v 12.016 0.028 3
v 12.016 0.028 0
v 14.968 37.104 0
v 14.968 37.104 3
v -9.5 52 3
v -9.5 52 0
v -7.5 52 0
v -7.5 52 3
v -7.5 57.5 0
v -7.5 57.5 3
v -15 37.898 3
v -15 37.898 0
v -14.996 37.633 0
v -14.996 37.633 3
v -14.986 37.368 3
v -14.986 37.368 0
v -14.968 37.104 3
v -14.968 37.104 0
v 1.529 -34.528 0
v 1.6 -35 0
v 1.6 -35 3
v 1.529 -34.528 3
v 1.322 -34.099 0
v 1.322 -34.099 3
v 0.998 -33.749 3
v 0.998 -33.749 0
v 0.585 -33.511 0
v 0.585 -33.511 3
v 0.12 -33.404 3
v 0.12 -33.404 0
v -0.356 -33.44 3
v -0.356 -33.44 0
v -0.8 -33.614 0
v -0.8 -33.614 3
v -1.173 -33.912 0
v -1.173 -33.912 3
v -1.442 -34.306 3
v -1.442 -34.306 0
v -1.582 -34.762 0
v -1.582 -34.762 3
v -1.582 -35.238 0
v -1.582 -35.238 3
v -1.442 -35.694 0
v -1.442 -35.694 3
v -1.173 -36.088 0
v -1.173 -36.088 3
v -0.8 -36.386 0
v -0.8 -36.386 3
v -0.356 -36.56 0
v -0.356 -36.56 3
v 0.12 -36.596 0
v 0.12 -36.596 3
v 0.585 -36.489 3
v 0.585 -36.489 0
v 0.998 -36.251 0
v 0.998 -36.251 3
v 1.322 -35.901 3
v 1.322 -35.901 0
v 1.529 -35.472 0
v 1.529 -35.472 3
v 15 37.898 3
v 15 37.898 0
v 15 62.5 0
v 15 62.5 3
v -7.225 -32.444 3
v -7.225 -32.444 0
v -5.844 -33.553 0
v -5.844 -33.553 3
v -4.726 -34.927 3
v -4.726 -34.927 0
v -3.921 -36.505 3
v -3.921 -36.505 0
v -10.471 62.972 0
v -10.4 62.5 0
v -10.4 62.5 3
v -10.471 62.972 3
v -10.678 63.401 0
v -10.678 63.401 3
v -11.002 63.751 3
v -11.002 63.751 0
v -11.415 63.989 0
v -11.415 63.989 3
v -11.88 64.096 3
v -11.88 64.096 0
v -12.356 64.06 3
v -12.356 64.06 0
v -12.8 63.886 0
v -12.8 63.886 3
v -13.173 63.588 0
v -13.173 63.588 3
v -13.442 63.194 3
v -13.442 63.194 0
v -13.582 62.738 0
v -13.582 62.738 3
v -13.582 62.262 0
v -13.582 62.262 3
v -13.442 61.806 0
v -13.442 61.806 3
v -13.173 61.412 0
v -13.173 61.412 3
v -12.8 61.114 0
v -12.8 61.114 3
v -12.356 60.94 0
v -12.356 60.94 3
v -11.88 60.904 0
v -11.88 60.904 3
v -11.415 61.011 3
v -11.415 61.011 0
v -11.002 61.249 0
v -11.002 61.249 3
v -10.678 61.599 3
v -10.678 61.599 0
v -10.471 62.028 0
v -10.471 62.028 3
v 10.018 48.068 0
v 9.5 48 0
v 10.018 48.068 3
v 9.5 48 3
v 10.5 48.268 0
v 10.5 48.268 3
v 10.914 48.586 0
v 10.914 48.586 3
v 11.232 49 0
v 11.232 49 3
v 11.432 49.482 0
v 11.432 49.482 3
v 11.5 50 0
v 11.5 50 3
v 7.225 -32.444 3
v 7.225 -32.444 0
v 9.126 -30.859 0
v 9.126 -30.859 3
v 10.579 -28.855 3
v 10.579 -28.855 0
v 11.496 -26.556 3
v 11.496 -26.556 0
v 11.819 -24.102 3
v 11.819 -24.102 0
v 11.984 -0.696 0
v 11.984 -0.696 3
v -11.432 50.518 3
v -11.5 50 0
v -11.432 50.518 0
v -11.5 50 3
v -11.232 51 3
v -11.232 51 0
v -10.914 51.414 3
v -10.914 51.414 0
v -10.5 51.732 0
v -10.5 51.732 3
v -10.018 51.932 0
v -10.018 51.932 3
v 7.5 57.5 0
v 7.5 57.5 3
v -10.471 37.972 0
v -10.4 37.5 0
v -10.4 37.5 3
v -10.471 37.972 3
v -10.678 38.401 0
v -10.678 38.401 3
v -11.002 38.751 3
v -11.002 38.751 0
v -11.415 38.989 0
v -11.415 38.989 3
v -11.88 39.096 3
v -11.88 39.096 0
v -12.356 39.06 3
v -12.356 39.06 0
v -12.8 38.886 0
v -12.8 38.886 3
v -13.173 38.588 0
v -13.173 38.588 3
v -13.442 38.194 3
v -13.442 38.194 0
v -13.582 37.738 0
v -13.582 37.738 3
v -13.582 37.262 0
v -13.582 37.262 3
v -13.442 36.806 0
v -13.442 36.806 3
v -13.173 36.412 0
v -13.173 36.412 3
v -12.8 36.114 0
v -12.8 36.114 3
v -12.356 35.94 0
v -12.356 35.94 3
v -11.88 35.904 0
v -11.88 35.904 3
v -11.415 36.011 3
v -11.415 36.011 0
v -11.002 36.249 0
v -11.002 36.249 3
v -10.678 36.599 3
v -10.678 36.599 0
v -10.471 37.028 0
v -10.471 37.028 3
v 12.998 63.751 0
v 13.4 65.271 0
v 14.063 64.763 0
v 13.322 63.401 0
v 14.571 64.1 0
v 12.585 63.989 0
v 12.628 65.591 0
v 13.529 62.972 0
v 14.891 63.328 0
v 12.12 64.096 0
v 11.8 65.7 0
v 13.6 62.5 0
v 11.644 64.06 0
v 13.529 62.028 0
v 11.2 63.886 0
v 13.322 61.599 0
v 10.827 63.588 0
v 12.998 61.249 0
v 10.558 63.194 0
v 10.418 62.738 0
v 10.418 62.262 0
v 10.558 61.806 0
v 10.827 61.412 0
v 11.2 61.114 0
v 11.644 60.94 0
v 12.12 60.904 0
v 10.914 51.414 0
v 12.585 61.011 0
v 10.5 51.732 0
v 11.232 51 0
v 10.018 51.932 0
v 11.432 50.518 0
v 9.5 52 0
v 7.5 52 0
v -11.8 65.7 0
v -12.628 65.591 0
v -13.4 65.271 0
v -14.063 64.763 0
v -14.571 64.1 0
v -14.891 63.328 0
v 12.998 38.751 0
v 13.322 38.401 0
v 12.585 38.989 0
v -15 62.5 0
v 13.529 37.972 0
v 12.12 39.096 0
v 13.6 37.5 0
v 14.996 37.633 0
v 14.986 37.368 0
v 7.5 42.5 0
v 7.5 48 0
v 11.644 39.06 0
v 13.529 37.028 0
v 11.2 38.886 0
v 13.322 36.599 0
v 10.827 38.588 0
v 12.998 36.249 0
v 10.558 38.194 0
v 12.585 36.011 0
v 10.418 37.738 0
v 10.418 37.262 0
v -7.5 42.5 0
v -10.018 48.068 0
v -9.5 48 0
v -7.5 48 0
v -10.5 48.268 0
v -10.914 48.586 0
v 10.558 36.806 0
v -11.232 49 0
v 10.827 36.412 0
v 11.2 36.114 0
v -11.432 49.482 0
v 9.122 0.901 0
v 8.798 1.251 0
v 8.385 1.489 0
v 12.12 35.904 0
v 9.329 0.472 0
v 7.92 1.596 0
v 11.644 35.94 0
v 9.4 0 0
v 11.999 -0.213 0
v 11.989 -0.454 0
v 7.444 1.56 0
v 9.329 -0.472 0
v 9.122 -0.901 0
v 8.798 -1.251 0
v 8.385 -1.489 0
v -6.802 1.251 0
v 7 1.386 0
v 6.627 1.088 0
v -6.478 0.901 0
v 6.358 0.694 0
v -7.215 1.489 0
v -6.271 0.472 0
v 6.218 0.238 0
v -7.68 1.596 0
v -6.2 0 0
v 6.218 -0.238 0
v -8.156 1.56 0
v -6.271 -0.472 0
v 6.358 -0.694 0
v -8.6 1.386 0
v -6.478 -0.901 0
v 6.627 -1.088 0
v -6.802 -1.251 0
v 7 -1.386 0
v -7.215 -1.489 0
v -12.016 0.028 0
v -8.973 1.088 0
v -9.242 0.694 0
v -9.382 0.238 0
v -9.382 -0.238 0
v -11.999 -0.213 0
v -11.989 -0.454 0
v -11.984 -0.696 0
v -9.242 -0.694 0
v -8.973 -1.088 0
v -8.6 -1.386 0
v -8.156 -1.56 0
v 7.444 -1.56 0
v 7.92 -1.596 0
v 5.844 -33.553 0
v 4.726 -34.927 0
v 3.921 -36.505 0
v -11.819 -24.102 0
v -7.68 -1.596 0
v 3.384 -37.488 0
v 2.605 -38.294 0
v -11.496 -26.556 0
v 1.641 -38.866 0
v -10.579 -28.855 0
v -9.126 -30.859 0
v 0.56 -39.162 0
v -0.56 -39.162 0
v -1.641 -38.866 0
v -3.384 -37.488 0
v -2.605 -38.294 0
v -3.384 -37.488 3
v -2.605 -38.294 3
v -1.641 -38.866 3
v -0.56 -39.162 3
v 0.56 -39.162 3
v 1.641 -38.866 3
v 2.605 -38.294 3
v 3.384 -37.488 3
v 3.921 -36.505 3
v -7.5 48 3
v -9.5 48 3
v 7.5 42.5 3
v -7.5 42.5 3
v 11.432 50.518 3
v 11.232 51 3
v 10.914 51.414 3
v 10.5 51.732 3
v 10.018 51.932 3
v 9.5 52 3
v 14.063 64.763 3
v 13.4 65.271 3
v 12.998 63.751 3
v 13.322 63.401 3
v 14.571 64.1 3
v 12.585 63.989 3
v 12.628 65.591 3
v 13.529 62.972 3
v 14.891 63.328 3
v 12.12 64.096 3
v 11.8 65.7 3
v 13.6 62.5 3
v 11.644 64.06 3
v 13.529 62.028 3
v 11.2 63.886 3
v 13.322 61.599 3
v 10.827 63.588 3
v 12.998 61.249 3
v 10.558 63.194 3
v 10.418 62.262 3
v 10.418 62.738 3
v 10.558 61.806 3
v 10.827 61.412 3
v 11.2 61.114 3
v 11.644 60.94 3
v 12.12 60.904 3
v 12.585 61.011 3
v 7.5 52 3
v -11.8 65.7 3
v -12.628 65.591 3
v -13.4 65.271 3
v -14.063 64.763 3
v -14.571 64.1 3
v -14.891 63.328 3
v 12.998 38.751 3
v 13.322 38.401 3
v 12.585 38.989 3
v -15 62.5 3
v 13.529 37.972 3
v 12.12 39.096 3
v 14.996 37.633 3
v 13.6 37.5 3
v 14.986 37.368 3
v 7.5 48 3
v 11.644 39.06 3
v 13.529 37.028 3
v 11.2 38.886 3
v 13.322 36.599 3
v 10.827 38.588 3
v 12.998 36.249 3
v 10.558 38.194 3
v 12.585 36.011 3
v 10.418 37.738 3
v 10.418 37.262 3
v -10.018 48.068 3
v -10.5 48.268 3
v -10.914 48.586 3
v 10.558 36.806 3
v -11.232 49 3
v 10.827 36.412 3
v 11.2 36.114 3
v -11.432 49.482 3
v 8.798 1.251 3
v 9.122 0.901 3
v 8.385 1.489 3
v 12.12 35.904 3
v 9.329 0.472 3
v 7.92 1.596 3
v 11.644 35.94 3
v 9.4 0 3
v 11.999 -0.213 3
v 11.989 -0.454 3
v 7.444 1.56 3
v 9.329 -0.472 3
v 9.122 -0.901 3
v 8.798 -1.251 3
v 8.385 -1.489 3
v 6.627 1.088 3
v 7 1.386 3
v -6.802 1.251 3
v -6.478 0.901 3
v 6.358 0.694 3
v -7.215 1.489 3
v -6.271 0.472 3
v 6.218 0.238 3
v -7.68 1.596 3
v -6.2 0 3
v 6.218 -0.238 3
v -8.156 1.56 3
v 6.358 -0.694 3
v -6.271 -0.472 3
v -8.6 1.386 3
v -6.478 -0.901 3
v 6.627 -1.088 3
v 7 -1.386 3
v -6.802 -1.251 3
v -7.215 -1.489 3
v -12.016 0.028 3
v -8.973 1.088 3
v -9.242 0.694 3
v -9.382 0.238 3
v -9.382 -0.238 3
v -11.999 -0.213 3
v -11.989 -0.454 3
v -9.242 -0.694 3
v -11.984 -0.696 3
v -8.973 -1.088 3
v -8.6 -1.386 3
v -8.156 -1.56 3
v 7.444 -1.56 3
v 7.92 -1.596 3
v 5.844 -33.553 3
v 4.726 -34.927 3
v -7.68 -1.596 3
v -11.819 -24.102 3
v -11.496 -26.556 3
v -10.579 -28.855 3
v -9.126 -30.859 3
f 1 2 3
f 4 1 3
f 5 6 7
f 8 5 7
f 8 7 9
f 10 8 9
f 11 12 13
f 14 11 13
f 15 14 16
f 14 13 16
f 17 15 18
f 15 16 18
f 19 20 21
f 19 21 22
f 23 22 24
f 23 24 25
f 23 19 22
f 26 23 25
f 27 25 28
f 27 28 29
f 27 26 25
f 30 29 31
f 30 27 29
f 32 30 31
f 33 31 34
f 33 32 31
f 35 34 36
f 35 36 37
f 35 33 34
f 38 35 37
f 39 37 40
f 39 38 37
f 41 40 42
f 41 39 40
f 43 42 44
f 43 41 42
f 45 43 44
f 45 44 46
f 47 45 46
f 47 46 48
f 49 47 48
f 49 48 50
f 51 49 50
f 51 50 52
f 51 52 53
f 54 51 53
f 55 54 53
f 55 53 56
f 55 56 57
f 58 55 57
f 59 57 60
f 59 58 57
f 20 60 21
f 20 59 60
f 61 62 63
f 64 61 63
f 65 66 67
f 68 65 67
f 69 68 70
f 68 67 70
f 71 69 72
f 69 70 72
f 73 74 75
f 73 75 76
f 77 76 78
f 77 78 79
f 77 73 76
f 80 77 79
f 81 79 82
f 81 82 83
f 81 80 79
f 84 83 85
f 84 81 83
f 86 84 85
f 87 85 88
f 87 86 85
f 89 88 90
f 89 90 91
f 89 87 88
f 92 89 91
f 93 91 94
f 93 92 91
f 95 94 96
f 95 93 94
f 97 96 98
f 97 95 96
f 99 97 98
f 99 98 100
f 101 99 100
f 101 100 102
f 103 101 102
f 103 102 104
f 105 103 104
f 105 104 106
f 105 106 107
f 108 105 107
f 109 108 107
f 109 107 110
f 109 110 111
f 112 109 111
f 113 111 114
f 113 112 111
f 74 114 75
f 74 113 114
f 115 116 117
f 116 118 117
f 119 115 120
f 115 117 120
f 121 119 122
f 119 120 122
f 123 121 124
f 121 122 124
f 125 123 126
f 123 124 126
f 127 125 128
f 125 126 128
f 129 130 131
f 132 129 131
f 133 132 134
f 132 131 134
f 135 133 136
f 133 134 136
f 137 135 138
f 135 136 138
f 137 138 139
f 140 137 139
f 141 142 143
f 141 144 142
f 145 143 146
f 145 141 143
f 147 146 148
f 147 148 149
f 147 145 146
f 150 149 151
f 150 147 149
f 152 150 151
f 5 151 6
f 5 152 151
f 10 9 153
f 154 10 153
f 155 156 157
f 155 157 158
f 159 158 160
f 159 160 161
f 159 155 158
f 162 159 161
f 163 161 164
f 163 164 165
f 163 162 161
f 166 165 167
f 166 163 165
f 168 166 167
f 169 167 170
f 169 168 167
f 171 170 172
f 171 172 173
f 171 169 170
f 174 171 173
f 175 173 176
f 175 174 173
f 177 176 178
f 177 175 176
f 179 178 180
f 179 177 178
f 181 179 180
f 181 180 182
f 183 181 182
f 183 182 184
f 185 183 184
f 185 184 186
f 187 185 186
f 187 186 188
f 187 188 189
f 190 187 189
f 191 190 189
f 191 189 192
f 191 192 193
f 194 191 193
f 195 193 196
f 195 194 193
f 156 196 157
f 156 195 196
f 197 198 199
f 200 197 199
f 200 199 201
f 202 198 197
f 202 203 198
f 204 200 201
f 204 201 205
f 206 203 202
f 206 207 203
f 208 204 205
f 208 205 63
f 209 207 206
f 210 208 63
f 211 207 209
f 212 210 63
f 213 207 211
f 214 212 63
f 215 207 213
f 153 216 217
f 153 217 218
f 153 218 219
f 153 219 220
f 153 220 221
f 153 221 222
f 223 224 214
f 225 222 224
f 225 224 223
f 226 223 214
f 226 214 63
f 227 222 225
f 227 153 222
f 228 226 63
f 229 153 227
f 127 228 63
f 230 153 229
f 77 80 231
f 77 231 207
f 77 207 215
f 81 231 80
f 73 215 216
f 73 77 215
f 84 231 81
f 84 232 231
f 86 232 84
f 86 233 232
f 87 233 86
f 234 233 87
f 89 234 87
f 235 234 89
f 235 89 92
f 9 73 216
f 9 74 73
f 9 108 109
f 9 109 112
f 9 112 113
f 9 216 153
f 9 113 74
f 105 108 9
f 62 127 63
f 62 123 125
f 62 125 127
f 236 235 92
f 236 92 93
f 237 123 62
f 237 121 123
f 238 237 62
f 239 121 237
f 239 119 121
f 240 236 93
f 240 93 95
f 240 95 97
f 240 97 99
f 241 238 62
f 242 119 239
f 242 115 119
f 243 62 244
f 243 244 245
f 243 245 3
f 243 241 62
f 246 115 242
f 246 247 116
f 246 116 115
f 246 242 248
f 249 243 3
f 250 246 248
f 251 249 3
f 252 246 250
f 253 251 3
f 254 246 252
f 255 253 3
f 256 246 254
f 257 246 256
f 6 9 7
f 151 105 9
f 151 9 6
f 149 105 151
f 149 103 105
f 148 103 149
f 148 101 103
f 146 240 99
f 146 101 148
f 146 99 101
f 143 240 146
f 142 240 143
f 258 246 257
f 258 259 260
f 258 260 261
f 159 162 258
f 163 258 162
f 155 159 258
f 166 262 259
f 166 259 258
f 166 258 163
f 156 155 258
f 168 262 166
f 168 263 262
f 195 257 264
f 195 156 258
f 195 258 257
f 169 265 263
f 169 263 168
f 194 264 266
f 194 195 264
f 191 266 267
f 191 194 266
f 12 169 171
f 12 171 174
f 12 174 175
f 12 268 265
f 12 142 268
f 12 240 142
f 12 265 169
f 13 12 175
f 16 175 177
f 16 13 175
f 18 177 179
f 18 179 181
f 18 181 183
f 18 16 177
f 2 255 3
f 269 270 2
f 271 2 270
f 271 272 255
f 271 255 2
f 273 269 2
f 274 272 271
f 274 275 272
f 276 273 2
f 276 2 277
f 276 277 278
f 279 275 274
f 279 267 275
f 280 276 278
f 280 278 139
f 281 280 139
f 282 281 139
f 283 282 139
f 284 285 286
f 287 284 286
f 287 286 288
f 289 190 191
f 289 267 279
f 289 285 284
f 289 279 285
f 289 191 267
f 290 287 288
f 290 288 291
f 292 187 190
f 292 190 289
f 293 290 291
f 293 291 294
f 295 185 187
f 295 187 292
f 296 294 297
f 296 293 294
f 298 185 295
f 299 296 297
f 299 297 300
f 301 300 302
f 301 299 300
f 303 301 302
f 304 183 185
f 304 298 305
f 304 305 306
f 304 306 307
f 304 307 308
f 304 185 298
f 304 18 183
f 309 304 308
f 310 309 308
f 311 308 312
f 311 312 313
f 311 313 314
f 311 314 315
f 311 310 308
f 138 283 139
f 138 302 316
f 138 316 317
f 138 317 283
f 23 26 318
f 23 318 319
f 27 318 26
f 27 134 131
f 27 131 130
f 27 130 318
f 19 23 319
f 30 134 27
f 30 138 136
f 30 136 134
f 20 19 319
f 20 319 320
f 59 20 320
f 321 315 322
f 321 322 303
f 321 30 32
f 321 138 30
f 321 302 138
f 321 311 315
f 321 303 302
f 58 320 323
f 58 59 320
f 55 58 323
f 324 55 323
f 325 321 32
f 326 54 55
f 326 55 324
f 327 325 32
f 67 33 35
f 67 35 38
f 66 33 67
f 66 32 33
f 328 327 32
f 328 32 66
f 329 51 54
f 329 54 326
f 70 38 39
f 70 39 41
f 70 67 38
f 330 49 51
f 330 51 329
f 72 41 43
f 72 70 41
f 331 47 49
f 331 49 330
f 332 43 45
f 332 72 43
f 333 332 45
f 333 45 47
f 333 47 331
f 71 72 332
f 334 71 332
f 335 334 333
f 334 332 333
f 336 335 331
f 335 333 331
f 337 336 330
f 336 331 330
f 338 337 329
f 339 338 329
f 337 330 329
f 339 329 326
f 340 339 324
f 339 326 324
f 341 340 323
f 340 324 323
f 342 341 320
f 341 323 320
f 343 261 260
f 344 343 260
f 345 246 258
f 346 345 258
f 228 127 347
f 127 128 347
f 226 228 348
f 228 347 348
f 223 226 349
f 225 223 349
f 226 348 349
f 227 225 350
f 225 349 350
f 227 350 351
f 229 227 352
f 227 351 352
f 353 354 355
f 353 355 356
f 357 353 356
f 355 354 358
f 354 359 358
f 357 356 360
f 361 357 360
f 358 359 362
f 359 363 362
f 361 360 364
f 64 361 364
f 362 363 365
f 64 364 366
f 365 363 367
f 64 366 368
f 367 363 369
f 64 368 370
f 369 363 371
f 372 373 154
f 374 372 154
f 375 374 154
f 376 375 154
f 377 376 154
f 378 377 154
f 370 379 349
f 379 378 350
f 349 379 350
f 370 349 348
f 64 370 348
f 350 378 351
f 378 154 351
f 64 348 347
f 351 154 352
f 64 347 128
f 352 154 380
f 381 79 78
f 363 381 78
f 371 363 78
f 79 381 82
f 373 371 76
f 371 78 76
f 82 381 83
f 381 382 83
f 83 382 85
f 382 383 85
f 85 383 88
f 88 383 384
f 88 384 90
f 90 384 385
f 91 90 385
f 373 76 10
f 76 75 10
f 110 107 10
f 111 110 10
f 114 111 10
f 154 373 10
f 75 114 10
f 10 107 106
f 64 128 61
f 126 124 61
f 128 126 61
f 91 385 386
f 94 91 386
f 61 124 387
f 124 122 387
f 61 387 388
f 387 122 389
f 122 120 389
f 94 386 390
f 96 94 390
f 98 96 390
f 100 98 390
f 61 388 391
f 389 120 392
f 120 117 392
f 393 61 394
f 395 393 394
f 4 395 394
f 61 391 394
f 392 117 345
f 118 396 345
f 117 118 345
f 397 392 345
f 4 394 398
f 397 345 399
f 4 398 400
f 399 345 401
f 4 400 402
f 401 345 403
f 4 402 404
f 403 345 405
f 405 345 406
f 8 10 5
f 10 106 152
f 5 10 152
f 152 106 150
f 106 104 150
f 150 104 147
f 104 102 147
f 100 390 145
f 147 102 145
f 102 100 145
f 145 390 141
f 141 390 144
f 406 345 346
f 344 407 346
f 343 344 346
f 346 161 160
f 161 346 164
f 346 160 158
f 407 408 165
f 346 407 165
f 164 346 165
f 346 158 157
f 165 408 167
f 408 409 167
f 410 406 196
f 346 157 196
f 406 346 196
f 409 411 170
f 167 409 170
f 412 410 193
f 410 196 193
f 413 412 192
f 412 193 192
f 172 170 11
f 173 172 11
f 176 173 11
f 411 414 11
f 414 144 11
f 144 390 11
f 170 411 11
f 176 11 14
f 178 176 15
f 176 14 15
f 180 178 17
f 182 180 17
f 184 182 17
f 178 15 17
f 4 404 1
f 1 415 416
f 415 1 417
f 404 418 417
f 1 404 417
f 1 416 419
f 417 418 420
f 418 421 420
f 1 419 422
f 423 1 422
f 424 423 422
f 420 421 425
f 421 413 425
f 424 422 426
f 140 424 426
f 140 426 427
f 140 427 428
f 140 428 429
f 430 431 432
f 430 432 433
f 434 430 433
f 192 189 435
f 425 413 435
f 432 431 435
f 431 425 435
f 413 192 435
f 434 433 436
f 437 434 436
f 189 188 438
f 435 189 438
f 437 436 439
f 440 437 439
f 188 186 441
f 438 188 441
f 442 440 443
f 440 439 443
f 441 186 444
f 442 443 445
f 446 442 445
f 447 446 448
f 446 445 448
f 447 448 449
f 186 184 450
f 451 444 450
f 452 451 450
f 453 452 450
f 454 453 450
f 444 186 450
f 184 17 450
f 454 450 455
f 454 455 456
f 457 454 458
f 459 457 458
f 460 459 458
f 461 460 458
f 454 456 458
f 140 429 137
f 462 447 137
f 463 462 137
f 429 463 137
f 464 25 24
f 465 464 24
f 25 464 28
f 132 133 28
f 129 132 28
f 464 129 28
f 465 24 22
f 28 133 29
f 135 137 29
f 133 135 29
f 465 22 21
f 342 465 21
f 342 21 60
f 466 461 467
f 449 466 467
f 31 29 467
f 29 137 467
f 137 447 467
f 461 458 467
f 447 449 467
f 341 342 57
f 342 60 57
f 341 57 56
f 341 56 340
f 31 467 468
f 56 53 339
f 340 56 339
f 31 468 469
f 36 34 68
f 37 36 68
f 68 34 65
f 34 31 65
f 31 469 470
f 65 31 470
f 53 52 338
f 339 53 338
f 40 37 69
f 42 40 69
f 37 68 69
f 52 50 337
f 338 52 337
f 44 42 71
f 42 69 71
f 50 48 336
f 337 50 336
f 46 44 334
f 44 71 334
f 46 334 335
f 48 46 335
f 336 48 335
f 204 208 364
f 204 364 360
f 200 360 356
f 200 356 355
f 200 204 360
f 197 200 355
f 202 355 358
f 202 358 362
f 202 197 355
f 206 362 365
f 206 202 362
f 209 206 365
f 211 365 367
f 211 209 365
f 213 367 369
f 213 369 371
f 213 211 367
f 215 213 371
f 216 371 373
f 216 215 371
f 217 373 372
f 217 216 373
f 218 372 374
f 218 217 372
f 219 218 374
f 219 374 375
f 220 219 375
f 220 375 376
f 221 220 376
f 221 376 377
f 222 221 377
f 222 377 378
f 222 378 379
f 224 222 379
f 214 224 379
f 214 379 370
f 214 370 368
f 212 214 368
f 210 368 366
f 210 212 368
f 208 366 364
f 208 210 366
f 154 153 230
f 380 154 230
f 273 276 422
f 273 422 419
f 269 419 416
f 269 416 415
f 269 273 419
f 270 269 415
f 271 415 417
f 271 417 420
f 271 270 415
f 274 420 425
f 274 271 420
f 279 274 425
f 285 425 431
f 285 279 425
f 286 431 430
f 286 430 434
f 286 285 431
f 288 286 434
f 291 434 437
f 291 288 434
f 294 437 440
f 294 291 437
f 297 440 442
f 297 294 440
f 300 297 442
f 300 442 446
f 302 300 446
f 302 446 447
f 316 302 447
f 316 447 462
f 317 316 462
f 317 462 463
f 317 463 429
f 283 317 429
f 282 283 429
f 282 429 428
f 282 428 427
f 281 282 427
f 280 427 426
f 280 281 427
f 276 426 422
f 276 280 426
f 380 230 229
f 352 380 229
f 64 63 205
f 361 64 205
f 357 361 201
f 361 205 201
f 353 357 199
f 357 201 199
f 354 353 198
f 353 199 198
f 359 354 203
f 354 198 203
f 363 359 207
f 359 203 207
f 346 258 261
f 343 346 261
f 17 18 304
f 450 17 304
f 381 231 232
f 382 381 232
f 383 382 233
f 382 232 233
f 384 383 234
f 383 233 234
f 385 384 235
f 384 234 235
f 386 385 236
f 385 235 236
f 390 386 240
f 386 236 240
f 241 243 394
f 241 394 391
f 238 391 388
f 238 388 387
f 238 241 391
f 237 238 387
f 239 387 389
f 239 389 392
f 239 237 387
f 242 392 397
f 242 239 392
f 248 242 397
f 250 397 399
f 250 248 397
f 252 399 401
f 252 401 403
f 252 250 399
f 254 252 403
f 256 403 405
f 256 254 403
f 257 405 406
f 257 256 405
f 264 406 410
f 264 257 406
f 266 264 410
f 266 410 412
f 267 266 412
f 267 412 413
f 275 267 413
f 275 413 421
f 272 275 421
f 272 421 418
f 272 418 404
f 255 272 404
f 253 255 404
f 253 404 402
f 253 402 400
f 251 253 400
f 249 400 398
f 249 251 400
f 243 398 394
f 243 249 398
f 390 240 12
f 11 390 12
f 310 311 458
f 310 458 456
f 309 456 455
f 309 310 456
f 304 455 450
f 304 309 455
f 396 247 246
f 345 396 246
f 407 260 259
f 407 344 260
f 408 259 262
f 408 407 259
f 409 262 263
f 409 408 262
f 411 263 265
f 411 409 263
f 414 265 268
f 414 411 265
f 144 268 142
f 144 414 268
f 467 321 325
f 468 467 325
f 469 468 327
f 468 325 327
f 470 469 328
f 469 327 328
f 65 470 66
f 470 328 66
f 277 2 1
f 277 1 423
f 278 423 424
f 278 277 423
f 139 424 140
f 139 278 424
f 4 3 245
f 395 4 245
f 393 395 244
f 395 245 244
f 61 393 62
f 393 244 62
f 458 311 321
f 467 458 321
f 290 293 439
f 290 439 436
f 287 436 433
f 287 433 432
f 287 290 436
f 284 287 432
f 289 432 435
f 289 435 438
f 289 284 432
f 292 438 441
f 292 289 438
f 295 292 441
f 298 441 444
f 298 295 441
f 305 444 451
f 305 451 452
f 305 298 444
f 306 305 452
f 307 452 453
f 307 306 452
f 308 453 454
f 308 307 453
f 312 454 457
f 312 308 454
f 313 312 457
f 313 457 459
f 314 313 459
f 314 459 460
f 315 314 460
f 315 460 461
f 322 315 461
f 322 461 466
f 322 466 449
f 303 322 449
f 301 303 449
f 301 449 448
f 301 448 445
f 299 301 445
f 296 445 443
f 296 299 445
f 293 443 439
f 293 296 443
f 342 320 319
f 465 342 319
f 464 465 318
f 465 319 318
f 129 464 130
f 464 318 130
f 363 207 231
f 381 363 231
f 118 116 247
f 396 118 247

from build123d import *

# Parameters (mm, degrees)
SKETCH1_R           = 1.6
BOSS_EXTRUDE1_DEPTH = 3
FILLET1_R           = 10
FILLET2_R           = 2
FILLET3_R           = 2


# Some blends are built 0.0001 mm under size
with BuildPart() as part:
    # Sketch1 → Boss-Extrude1 (new body)
    with BuildSketch(Plane.XY):
        with BuildLine():
            Line((-15, 37.5), (-11.986741947, -0.333454454))
            Line((-11.986741947, -0.333454454), (-11.77, -31.11))
            ThreePointArc((-11.77, -31.11), (-7.007950772, -32.588761506), (-3.921159912, -36.504827214))
            ThreePointArc((-3.921159912, -36.504827214), (0, -39.2), (3.921159912, -36.504827214))
            ThreePointArc((3.921159912, -36.504827214), (7.007950772, -32.588761506), (11.77, -31.11))
            Line((11.77, -31.11), (11.986741947, -0.333454454))
            Line((11.986741947, -0.333454454), (15, 37.5))
            Line((15, 37.5), (15, 62.5))
            ThreePointArc((15, 62.5), (14.0627417, 64.7627417), (11.8, 65.7))
            Line((11.8, 65.7), (-11.8, 65.7))
            ThreePointArc((-11.8, 65.7), (-14.0627417, 64.7627417), (-15, 62.5))
            Line((-15, 62.5), (-15, 37.5))
        make_face()
        with Locations((7.8, 0)):
            Circle(SKETCH1_R, mode=Mode.SUBTRACT)
        with Locations((-12, 37.5)):
            Circle(SKETCH1_R, mode=Mode.SUBTRACT)
        with Locations((-12, 62.5)):
            Circle(SKETCH1_R, mode=Mode.SUBTRACT)
        Polygon((-7.5, 57.5), (7.5, 57.5), (7.5, 52), (11.5, 52), (11.5, 48), (7.5, 48), (7.5, 42.5), (-7.5, 42.5), (-7.5, 48), (-11.5, 48), (-11.5, 52), (-7.5, 52), align=None, mode=Mode.SUBTRACT)
        with Locations((12, 37.5)):
            Circle(SKETCH1_R, mode=Mode.SUBTRACT)
        with Locations((12, 62.5)):
            Circle(SKETCH1_R, mode=Mode.SUBTRACT)
        with Locations((-7.8, 0)):
            Circle(SKETCH1_R, mode=Mode.SUBTRACT)
        with Locations((0, -35)):
            Circle(SKETCH1_R, mode=Mode.SUBTRACT)
    extrude(amount=BOSS_EXTRUDE1_DEPTH)

    # Fillet1
    # the kernel refuses this fillet: 10 mm, written as the material it adds along each edge
    with BuildSketch(Plane(origin=(-11.986741947, -0.333454454, 0), x_dir=(-0.07939391755808242, 0.9968433206150205, 0), z_dir=(0, 0, 1)), Plane(origin=(11.986741947, -0.333454454, 0), x_dir=(-0.0070422644314045895, -0.9999752029483923, 0), z_dir=(0, 0, 1))) as fillet1_piece_1:
        with BuildLine():
            CenterArc((FILLET1_R * 0.0362334645201, FILLET1_R), FILLET1_R, 265.849766407, 4.150233593)
            Line((-FILLET1_R * 0.0361384500424, FILLET1_R * 0.00262228519856), (0, 0))
            Line((0, 0), (FILLET1_R * 0.0362334645201, 0))
        make_face()
    extrude(amount=3)
    # the kernel refuses this fillet: 10 mm, written as the material it takes off along each edge
    with BuildSketch(Plane(origin=(-11.77, -31.11, -17.521148691), x_dir=(-0.007042264431403126, 0.9999752029483922, 0), z_dir=(0, 0, 1))) as fillet1_2_piece_1:
        with BuildLine():
            CenterArc((7.008459476, -10), FILLET1_R, 90, 56.873561784)
            ThreePointArc((-1.366206899, -4.535115453), (-0.357121593, -2.365760003), (0, 0))
            Line((0, 0), (7.008459476, 0))
        make_face()
    extrude(amount=38.042297381, mode=Mode.SUBTRACT)
    with BuildSketch(Plane(origin=(-15, 37.5, -0.993992828), x_dir=(0, 1, 0), z_dir=(0, 0, 1)), Plane(origin=(15, 37.5, -0.993992828), x_dir=(-0.07939391755808864, -0.9968433206150199, 0), z_dir=(0, 0, 1))) as fillet1_2_piece_2:
        with BuildLine():
            CenterArc((FILLET1_R * 0.0397597131124, -FILLET1_R), FILLET1_R, 90, 4.553728958)
            Line((-FILLET1_R * 0.0396342044457, -FILLET1_R * 0.00315667938498), (0, 0))
            Line((0, 0), (FILLET1_R * 0.0397597131124, 0))
        make_face()
    extrude(amount=4.987985656, mode=Mode.SUBTRACT)
    with BuildSketch(Plane(origin=(11.77, -31.11, -17.521148691), x_dir=(-0.9595036182786473, -0.2816963019107352, 0), z_dir=(0, 0, 1))) as fillet1_2_piece_3:
        with BuildLine():
            CenterArc((7.553395586, -9.595036183), FILLET1_R, 106.361471425, 56.873561784)
            Line((-2.02156487, -6.710572234), (0, 0))
            ThreePointArc((0, 0), (2.368216284, -0.34045243), (4.736432567, 0))
        make_face()
    extrude(amount=38.042297381, mode=Mode.SUBTRACT)

    # Fillet2
    fillet2_edges = [part.edges().sort_by_distance(p)[0] for p in [
        (-11.5, 52, 1.5),
        (-11.5, 48, 1.5),
    ]]
    fillet(fillet2_edges, radius=FILLET2_R - 0.0001)  # a hair under: the kernel refuses the full size

    # Fillet3
    fillet3_edges = [part.edges().sort_by_distance(p)[0] for p in [
        (11.5, 48, 1.5),
        (11.5, 52, 1.5),
    ]]
    fillet(fillet3_edges, radius=FILLET3_R - 0.0001)  # a hair under: the kernel refuses the full size


solid = part.part
